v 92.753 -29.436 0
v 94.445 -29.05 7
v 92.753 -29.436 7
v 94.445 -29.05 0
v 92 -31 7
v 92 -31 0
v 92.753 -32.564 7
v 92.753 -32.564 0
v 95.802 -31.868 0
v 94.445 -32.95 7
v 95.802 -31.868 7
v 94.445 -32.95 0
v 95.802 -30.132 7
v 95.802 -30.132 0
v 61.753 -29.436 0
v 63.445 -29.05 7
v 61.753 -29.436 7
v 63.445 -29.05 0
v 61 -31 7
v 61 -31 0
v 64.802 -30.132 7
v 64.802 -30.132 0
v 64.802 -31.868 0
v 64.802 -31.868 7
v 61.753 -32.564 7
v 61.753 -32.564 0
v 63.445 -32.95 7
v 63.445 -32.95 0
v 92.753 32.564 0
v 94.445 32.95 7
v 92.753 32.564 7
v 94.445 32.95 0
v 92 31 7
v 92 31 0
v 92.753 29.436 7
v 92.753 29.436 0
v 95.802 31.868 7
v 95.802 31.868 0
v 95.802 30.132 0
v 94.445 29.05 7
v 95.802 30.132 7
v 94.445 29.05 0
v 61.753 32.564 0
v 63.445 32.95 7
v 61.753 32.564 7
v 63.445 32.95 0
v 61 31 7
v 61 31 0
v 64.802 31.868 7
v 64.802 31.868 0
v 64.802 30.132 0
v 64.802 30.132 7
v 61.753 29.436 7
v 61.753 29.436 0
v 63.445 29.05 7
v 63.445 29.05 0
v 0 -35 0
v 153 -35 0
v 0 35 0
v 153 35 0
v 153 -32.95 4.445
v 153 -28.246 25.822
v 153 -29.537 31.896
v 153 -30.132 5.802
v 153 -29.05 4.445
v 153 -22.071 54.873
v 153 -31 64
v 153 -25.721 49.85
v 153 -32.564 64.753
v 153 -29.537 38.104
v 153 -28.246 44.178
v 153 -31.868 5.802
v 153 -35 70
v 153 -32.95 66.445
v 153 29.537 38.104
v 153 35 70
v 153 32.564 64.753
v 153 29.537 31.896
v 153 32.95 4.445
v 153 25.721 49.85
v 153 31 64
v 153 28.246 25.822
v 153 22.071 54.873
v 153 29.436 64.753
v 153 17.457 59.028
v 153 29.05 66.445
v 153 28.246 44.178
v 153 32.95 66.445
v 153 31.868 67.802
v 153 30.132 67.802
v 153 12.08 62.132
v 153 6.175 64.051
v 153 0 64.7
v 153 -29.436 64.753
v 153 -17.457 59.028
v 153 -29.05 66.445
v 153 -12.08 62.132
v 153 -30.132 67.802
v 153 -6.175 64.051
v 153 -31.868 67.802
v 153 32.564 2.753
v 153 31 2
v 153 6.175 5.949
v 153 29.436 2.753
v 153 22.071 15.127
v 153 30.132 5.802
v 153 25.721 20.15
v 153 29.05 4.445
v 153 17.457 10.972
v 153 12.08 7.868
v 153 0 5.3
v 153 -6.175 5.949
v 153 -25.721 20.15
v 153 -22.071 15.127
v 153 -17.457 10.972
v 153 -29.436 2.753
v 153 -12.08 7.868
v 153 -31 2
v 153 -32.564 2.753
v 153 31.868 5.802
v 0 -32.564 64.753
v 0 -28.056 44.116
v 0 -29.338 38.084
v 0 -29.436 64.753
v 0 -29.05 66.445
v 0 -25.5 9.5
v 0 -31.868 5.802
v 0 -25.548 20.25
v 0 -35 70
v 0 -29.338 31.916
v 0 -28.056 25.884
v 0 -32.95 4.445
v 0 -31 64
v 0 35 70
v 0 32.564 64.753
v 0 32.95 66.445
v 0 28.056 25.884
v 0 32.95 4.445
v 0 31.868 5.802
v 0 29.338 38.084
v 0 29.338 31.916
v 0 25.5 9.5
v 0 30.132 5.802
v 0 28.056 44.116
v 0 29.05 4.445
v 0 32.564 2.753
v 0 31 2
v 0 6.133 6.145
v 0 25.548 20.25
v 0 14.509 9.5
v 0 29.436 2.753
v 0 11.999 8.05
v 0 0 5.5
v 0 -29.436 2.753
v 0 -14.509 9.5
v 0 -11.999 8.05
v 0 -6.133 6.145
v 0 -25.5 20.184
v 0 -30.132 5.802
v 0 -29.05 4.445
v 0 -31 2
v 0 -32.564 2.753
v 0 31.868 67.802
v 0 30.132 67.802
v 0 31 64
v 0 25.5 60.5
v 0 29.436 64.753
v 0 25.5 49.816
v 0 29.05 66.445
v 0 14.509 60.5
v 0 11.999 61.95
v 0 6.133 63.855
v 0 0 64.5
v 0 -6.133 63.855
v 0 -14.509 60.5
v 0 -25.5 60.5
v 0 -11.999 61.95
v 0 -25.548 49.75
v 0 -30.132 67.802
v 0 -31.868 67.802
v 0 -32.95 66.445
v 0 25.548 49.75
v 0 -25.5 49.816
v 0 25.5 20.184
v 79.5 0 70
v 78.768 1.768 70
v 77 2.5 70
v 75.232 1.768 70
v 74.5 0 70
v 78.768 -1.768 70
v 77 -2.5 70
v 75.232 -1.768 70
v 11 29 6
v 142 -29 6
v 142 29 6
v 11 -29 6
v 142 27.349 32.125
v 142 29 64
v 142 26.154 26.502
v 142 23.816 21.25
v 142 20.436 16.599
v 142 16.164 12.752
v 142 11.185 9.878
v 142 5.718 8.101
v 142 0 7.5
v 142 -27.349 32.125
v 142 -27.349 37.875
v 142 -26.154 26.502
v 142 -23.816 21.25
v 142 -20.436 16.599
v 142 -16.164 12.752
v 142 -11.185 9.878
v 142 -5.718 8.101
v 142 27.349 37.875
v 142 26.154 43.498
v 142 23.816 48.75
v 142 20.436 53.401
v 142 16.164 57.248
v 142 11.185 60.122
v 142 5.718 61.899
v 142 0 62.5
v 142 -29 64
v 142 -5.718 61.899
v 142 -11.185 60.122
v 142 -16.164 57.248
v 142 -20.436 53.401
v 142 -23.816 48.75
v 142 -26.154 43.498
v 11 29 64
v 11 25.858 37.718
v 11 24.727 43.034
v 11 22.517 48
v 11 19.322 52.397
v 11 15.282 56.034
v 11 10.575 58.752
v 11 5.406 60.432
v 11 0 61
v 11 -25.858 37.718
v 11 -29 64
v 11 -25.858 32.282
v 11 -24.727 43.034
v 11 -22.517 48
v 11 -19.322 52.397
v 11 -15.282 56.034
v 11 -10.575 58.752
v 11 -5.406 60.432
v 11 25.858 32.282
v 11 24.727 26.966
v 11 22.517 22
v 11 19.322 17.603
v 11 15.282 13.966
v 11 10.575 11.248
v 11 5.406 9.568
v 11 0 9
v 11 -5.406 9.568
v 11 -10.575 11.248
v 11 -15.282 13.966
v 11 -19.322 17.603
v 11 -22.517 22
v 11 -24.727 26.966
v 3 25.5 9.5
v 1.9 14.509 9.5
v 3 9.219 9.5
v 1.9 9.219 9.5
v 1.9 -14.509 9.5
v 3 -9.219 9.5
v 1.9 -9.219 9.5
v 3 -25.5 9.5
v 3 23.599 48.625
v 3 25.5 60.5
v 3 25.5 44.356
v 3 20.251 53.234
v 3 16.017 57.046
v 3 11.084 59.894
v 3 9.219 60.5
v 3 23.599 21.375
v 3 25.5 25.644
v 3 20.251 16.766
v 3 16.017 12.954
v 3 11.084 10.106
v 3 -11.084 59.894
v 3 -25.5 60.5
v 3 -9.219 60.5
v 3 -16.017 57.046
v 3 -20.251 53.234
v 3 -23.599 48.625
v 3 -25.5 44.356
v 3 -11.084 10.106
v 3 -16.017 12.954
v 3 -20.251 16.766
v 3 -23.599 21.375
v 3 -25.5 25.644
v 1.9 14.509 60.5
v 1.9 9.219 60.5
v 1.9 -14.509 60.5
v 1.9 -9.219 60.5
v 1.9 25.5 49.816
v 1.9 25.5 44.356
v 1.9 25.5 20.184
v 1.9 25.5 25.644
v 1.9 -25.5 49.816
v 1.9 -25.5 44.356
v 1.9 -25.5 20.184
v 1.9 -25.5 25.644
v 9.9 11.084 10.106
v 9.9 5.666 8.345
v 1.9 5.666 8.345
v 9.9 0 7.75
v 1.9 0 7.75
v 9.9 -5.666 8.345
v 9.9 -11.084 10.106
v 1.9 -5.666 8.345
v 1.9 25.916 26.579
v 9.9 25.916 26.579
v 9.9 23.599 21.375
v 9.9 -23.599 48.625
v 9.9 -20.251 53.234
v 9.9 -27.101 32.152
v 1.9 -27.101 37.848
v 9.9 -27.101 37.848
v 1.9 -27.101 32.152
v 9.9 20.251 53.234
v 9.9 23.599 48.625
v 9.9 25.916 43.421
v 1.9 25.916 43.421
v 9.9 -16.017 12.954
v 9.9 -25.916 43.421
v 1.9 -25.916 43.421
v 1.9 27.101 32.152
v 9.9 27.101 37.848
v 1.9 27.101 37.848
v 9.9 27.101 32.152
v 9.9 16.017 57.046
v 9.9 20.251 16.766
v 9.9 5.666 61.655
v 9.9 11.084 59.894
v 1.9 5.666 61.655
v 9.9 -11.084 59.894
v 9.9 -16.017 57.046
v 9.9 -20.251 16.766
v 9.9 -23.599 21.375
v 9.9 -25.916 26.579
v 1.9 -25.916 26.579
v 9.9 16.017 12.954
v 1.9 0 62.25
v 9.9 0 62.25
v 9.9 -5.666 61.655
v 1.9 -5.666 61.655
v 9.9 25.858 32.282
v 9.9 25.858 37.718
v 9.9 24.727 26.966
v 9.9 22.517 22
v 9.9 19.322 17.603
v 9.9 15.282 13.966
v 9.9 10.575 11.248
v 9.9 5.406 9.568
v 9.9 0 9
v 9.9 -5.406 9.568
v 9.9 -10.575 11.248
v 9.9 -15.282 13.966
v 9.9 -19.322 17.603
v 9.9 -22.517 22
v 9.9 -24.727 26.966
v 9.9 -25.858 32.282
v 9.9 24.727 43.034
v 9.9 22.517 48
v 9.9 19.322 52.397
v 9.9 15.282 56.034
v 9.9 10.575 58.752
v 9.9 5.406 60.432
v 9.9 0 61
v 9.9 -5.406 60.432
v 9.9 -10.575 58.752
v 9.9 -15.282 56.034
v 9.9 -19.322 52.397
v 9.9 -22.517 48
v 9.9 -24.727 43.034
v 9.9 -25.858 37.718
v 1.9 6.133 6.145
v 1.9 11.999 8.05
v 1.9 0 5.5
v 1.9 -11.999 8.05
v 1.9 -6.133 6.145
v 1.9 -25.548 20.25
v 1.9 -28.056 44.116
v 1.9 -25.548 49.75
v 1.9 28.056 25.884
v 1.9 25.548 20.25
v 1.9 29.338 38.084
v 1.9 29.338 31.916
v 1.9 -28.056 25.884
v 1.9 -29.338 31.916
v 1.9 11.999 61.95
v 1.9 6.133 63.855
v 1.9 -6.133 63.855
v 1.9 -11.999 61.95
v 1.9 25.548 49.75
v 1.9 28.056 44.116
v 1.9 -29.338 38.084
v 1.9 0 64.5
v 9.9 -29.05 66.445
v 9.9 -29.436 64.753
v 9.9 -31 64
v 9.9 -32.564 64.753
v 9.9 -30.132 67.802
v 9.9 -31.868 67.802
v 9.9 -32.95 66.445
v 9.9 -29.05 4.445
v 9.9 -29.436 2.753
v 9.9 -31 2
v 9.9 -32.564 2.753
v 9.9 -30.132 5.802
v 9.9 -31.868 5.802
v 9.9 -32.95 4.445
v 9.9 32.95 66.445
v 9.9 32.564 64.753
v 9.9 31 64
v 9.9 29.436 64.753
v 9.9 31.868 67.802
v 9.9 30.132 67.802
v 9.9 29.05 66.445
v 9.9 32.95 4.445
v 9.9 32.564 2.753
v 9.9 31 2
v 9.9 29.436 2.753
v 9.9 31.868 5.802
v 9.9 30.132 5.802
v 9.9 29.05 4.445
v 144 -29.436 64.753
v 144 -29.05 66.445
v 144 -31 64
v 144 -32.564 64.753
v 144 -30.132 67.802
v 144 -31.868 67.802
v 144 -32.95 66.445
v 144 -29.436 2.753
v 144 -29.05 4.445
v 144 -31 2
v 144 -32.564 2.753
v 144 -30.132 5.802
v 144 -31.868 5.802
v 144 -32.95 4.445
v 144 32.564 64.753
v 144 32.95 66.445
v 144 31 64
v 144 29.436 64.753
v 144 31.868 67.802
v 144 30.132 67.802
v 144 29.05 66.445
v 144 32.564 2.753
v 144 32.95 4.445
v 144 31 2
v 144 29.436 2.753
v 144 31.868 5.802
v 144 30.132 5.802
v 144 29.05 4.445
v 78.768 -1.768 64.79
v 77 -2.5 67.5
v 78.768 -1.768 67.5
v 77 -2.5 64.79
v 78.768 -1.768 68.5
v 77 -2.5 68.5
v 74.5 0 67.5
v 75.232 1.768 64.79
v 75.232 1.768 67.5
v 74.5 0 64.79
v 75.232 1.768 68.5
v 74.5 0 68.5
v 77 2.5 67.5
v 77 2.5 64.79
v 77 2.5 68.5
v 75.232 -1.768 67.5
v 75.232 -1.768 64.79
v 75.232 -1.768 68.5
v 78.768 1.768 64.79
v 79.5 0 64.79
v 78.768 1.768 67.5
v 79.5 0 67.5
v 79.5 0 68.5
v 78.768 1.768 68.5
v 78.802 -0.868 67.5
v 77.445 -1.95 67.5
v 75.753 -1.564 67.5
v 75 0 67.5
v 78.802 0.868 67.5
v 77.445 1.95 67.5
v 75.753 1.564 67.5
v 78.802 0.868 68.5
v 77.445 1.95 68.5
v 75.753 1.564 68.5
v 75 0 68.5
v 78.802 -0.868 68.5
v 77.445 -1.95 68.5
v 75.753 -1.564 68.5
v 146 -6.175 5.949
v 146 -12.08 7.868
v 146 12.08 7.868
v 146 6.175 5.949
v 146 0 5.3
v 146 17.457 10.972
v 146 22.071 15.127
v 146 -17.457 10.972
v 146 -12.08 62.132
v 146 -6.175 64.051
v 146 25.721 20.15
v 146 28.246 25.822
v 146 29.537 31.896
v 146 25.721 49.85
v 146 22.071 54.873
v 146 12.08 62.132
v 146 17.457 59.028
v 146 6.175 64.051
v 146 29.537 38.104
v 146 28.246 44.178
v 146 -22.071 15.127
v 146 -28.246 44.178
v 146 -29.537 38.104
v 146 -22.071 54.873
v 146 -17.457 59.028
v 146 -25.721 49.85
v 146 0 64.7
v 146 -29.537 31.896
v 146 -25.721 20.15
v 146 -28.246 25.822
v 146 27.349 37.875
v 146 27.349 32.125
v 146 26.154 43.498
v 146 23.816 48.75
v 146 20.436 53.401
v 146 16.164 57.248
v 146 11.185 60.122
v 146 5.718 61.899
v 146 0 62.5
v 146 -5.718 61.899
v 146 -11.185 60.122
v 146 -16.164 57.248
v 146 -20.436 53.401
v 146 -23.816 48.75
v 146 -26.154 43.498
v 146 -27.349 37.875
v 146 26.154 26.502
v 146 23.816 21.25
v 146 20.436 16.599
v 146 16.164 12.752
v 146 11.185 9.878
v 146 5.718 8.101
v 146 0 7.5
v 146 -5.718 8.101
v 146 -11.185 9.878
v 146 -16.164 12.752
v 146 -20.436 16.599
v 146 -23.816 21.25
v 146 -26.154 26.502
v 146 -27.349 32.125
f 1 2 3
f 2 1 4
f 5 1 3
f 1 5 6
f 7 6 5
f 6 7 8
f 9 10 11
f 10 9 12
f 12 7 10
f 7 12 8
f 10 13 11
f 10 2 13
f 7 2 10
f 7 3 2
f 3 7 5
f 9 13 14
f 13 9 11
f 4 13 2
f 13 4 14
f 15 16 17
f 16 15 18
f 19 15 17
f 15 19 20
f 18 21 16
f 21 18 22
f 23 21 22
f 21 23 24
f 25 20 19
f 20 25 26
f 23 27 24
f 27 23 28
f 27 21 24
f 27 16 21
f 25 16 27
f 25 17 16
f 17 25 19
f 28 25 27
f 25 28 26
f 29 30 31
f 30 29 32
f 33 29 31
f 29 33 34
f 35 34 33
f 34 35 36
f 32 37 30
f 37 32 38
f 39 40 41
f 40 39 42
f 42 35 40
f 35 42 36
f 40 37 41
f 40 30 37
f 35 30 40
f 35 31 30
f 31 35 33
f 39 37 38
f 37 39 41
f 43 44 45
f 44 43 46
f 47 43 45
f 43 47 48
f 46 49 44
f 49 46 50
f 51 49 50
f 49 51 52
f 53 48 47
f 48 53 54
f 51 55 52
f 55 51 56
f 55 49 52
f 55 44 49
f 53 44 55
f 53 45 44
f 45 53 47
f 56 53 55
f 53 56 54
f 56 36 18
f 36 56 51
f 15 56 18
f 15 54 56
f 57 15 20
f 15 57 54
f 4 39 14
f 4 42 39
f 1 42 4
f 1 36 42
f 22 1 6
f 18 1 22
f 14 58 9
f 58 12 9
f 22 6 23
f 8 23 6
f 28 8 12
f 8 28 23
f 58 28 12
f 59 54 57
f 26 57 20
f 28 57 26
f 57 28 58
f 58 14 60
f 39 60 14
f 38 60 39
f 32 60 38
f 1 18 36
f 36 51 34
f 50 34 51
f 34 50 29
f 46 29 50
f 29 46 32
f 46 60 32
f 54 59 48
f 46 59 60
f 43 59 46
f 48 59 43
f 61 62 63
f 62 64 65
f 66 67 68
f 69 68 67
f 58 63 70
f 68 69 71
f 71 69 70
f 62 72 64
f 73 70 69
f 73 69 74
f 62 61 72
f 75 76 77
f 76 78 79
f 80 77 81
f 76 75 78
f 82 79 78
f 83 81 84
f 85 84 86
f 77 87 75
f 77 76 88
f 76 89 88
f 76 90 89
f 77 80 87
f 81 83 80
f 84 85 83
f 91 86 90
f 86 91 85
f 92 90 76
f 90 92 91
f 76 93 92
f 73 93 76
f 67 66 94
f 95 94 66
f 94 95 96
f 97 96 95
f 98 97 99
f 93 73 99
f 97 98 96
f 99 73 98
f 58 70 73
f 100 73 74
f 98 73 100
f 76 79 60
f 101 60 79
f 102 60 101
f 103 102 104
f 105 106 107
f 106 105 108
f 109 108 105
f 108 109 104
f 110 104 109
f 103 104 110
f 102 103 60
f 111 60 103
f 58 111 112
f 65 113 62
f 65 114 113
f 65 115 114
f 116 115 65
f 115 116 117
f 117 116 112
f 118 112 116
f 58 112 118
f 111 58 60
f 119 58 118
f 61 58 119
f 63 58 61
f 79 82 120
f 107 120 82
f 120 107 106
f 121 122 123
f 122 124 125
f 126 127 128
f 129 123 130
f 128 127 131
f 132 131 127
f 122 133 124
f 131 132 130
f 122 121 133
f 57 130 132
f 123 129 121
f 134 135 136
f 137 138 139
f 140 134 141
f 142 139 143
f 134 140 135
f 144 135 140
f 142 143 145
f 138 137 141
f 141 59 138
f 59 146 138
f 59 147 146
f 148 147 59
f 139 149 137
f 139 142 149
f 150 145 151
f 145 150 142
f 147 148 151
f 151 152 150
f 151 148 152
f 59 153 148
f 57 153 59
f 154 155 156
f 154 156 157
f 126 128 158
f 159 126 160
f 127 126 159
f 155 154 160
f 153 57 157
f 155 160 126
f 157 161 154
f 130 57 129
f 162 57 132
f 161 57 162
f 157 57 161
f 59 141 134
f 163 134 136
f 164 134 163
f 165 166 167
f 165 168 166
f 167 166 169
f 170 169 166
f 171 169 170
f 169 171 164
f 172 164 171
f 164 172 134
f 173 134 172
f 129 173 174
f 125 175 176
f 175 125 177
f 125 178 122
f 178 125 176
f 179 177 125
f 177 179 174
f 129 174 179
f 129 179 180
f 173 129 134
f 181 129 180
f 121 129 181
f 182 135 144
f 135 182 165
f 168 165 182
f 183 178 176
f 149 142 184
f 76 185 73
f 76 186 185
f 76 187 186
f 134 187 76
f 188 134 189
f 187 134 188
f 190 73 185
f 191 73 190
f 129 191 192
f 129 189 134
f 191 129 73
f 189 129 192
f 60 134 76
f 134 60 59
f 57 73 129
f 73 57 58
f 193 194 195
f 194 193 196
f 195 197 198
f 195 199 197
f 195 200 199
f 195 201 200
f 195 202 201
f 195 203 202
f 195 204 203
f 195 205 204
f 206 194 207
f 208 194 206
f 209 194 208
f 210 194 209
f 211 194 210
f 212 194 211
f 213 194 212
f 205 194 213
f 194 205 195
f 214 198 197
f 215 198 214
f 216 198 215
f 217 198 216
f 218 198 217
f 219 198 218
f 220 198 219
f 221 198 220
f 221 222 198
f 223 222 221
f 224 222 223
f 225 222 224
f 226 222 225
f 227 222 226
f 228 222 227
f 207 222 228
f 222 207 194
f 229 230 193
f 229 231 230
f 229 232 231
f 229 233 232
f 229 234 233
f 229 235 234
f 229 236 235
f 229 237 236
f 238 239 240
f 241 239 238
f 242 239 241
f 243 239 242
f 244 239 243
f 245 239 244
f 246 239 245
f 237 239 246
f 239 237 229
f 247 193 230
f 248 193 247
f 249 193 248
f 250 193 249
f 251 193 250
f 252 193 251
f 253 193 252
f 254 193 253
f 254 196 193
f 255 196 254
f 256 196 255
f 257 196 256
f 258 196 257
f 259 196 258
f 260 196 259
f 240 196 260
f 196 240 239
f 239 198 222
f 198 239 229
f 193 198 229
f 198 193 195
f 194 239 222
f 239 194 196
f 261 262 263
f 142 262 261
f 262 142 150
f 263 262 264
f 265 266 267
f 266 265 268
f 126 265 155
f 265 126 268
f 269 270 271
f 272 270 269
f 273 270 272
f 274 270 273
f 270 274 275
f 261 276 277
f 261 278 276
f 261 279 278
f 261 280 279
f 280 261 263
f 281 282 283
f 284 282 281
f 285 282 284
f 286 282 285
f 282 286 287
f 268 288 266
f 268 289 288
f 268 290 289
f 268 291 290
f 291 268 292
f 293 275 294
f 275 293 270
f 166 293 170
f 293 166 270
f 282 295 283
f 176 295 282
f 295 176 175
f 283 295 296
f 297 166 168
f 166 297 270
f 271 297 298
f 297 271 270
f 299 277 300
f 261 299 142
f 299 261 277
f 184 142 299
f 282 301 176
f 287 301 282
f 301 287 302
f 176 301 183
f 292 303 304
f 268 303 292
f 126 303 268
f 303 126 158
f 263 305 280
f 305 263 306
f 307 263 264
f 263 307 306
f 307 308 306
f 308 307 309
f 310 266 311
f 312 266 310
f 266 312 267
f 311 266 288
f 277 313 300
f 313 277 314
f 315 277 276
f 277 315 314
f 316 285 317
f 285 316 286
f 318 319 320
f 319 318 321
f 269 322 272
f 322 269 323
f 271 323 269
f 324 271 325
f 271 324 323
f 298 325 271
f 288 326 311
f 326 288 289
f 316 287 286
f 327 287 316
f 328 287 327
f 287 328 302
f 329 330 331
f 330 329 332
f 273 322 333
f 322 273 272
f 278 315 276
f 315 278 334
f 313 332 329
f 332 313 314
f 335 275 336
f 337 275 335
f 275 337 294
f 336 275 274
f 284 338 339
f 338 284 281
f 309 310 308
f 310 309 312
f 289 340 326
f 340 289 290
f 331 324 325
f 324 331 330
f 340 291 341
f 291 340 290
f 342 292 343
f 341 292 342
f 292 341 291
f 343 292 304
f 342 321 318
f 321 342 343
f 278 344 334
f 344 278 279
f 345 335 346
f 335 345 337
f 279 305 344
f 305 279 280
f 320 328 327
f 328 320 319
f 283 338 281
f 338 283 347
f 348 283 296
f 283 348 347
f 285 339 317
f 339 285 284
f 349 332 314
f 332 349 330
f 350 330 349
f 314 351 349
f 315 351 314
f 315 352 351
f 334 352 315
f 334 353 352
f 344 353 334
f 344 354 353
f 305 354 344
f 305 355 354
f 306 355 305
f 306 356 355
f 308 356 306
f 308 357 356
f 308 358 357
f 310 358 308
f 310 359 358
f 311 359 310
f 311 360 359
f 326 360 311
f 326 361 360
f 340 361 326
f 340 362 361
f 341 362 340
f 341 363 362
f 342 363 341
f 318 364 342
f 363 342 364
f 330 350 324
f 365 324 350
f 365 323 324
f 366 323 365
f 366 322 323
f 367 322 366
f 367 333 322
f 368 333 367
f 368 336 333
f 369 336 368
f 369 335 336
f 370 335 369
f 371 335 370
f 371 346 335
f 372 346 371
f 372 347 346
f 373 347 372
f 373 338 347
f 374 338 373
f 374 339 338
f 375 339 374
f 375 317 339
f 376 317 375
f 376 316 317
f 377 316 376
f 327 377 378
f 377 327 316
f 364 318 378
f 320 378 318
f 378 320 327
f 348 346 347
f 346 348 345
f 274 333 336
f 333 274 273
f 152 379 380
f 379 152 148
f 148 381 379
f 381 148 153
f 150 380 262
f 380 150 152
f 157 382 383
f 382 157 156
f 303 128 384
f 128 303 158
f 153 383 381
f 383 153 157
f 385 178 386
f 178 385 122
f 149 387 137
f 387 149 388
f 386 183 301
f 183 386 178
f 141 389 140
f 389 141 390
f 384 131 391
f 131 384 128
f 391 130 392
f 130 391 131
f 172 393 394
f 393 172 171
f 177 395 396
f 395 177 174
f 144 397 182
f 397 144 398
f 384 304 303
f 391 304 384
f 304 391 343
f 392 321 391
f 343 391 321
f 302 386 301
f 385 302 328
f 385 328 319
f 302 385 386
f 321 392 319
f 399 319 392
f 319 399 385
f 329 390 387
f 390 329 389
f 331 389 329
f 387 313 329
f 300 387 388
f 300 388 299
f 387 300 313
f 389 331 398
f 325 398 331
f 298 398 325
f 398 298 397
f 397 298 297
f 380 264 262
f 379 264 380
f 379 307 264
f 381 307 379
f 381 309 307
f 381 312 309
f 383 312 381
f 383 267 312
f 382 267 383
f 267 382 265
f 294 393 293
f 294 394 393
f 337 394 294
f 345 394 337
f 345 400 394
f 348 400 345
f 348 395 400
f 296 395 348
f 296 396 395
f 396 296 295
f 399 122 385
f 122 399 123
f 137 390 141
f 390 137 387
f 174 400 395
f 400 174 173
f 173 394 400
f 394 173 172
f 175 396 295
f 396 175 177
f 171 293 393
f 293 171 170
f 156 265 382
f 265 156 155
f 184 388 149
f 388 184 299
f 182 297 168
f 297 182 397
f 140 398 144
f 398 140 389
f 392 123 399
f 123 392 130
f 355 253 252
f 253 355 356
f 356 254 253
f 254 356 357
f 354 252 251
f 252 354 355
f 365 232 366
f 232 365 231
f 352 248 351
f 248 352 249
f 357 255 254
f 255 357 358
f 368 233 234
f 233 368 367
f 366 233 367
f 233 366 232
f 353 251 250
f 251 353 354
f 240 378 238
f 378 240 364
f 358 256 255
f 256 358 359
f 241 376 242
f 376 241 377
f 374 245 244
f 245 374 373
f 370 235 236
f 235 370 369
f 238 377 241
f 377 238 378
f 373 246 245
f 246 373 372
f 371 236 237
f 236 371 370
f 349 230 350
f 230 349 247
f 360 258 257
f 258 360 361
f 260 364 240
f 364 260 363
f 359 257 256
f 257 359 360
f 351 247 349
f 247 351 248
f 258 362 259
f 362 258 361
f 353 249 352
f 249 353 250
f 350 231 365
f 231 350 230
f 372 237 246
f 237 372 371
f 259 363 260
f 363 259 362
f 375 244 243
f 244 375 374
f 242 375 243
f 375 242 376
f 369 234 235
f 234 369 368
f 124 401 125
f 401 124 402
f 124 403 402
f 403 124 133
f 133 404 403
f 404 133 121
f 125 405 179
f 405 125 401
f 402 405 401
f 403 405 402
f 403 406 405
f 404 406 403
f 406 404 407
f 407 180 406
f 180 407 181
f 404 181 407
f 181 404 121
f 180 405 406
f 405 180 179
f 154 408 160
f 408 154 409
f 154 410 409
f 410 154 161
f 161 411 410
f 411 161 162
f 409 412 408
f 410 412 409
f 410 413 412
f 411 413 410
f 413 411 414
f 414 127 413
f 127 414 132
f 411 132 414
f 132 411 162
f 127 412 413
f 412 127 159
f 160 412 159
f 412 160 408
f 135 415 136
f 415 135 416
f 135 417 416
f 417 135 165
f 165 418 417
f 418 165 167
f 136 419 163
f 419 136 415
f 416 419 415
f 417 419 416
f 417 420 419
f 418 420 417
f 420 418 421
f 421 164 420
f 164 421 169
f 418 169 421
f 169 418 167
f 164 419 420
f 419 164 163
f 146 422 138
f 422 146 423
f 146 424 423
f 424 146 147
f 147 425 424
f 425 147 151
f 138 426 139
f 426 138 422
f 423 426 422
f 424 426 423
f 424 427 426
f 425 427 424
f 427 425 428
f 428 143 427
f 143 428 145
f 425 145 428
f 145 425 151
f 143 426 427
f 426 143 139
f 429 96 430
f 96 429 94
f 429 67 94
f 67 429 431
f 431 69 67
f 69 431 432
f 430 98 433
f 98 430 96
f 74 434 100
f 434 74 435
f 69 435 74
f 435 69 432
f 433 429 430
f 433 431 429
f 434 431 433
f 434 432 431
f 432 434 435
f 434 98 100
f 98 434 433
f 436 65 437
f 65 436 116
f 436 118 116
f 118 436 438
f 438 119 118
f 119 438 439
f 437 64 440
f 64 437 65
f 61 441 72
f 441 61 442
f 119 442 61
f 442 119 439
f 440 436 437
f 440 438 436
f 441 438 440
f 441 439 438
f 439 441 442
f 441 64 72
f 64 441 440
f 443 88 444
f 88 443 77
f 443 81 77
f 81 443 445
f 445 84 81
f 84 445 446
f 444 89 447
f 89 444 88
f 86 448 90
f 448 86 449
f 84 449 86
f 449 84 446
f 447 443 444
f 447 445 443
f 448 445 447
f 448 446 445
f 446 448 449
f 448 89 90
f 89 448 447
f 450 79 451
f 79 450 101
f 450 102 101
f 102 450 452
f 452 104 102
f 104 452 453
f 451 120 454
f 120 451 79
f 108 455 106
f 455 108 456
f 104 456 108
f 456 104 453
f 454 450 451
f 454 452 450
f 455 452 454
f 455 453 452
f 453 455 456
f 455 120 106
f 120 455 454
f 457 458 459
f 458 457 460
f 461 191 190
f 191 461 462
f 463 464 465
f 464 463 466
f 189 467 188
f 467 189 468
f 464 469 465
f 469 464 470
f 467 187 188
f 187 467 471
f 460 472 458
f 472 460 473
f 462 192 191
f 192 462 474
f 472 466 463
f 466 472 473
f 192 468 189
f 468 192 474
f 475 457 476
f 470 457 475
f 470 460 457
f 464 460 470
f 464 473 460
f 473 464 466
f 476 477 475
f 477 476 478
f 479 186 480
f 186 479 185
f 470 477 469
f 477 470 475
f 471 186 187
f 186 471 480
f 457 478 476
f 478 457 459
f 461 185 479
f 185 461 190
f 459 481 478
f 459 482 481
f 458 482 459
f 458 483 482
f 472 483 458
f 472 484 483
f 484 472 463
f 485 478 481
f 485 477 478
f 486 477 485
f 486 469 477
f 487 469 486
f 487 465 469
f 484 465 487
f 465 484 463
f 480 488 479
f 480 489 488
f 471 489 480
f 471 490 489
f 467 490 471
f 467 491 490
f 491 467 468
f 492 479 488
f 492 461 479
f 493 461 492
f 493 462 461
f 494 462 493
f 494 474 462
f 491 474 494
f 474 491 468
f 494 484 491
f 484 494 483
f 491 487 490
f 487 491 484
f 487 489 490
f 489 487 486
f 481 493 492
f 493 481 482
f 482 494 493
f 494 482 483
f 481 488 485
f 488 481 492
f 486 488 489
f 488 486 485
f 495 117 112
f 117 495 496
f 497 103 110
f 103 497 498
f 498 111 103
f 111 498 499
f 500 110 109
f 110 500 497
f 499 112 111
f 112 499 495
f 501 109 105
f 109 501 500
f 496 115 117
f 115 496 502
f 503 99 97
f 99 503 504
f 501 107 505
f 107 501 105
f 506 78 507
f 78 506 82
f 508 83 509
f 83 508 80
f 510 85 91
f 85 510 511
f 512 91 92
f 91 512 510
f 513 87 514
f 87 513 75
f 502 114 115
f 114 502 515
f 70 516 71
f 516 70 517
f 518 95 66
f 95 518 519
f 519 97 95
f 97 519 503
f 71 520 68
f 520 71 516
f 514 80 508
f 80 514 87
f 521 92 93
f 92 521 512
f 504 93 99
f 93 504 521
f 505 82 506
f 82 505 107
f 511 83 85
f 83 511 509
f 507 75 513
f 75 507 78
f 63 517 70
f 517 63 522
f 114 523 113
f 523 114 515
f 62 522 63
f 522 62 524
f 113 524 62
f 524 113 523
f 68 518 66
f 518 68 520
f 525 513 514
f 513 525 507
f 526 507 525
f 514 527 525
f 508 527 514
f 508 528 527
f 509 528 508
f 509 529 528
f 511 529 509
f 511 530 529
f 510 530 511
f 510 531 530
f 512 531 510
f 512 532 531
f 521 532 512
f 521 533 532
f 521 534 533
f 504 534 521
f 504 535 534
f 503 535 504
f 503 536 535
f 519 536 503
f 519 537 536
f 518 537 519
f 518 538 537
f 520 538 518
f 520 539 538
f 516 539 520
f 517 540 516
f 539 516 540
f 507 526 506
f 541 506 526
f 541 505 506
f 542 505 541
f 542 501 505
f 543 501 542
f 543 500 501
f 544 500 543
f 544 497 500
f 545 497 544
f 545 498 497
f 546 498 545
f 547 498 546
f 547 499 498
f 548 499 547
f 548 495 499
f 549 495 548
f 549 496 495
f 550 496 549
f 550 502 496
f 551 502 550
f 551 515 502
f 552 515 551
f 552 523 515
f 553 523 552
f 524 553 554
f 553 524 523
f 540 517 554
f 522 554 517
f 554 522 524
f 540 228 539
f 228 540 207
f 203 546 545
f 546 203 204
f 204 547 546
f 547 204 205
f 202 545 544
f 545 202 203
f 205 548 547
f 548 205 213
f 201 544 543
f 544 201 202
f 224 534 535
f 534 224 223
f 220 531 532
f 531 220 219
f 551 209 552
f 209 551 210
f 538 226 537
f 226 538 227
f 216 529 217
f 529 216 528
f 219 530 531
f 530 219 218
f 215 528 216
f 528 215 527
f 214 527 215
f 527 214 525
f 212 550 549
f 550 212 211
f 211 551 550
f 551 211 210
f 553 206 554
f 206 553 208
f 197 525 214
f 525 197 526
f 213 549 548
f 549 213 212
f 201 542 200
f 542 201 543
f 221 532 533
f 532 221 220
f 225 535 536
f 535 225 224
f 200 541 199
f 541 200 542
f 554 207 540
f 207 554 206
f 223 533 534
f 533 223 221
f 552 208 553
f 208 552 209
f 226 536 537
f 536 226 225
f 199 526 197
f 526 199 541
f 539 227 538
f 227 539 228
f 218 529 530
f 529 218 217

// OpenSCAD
bigW = 70;
ori = bigW/2;
raspSellR = 59;
tuboH = 140;
H = tuboH+2+8+1+2;
selloH = 7;

huecoPared = 12;
huecoH = 22;

translate([0,0,bigW/2])
rotate([0,90,0])
bigTuboHueco();

module bigTuboHueco()
{
	difference()
	{
		bigTubo();	
		sello();
	}
}


module sello()
{
	translate([0,0,H-selloH])
	cylinder(r=(raspSellR/2)+0.2,selloH+0.1);
	
	translate([0,0,H-selloH-30])
	cylinder(r=(raspSellR/2)-2,selloH+40);
}


module bigTubo(){

difference(){

//Bloque
translate([-bigW/2,-bigW/2,0])
cube([bigW,bigW,H]);


translate([
						-(bigW-huecoPared)/2,
						-(bigW-huecoPared)/2,
						(huecoH/2)
					])
		cube([
					bigW-huecoPared,
					bigW-huecoPared,
					H-huecoH]
				);


//Diffractador
translate([-25.5,-25.5,-0.1])
cube([51,51,3.1]);

//Macro
translate([0,0,-0.1])
cylinder(r=(54.5/2),10);

//Sello de raspberry
translate([0,0,-0.1])
cylinder(r=(raspSellR/2),2);

//Tubo
translate([0,0,-0.1])
cylinder(r=(52/2),200);

//Tornillos abajo
translate([-ori+4,-ori+4,-0.1])
cylinder(r=2,10);
translate([ori-4,-ori+4,-0.1])
cylinder(r=2,10);
translate([-ori+4,ori-4,-0.1])
cylinder(r=2,10);
translate([ori-4,ori-4,-0.1])
cylinder(r=2,10);

//Hueco
//translate([0,0,2+8+1+2])
//cylinder(r=(raspSellR/2),tuboH+0.1);

//Tornillos arriba
translate([-ori+4,-ori+4,H-9])
cylinder(r=2,10);
translate([ori-4,-ori+4,H-9])
cylinder(r=2,10);
translate([-ori+4,ori-4,H-9])
cylinder(r=2,10);
translate([ori-4,ori-4,H-9])
cylinder(r=2,10);

//Tornillos caja
translate([0,0,(tuboH/2)-7])
rotate([0,90,0])
tornillosArriba();

//Tornillo tripie
translate([-ori-0.1,0,(tuboH/2)+7])
rotate([0,90,0])
cylinder(r=5/2,5.31);


}


//Rosca tornillo tripie
difference(){
translate([-ori+1.5,0,(tuboH/2)+7])
rotate([0,90,0])
cylinder(r=5,1);

translate([-ori+1.4,0,(tuboH/2)+7])
rotate([0,90,0])
cylinder(r=5-3,3);


}

}

module tornillosArriba(){
translate([-ori+4,-ori+4,ori-7])
cylinder(r=2,10);
translate([0,-ori+4,ori-7])
cylinder(r=2,10);
translate([-ori+4,ori-4,ori-7])
cylinder(r=2,10);
translate([0,ori-4,ori-7])
cylinder(r=2,10);
}


module tornilloTripie(){
	
}
